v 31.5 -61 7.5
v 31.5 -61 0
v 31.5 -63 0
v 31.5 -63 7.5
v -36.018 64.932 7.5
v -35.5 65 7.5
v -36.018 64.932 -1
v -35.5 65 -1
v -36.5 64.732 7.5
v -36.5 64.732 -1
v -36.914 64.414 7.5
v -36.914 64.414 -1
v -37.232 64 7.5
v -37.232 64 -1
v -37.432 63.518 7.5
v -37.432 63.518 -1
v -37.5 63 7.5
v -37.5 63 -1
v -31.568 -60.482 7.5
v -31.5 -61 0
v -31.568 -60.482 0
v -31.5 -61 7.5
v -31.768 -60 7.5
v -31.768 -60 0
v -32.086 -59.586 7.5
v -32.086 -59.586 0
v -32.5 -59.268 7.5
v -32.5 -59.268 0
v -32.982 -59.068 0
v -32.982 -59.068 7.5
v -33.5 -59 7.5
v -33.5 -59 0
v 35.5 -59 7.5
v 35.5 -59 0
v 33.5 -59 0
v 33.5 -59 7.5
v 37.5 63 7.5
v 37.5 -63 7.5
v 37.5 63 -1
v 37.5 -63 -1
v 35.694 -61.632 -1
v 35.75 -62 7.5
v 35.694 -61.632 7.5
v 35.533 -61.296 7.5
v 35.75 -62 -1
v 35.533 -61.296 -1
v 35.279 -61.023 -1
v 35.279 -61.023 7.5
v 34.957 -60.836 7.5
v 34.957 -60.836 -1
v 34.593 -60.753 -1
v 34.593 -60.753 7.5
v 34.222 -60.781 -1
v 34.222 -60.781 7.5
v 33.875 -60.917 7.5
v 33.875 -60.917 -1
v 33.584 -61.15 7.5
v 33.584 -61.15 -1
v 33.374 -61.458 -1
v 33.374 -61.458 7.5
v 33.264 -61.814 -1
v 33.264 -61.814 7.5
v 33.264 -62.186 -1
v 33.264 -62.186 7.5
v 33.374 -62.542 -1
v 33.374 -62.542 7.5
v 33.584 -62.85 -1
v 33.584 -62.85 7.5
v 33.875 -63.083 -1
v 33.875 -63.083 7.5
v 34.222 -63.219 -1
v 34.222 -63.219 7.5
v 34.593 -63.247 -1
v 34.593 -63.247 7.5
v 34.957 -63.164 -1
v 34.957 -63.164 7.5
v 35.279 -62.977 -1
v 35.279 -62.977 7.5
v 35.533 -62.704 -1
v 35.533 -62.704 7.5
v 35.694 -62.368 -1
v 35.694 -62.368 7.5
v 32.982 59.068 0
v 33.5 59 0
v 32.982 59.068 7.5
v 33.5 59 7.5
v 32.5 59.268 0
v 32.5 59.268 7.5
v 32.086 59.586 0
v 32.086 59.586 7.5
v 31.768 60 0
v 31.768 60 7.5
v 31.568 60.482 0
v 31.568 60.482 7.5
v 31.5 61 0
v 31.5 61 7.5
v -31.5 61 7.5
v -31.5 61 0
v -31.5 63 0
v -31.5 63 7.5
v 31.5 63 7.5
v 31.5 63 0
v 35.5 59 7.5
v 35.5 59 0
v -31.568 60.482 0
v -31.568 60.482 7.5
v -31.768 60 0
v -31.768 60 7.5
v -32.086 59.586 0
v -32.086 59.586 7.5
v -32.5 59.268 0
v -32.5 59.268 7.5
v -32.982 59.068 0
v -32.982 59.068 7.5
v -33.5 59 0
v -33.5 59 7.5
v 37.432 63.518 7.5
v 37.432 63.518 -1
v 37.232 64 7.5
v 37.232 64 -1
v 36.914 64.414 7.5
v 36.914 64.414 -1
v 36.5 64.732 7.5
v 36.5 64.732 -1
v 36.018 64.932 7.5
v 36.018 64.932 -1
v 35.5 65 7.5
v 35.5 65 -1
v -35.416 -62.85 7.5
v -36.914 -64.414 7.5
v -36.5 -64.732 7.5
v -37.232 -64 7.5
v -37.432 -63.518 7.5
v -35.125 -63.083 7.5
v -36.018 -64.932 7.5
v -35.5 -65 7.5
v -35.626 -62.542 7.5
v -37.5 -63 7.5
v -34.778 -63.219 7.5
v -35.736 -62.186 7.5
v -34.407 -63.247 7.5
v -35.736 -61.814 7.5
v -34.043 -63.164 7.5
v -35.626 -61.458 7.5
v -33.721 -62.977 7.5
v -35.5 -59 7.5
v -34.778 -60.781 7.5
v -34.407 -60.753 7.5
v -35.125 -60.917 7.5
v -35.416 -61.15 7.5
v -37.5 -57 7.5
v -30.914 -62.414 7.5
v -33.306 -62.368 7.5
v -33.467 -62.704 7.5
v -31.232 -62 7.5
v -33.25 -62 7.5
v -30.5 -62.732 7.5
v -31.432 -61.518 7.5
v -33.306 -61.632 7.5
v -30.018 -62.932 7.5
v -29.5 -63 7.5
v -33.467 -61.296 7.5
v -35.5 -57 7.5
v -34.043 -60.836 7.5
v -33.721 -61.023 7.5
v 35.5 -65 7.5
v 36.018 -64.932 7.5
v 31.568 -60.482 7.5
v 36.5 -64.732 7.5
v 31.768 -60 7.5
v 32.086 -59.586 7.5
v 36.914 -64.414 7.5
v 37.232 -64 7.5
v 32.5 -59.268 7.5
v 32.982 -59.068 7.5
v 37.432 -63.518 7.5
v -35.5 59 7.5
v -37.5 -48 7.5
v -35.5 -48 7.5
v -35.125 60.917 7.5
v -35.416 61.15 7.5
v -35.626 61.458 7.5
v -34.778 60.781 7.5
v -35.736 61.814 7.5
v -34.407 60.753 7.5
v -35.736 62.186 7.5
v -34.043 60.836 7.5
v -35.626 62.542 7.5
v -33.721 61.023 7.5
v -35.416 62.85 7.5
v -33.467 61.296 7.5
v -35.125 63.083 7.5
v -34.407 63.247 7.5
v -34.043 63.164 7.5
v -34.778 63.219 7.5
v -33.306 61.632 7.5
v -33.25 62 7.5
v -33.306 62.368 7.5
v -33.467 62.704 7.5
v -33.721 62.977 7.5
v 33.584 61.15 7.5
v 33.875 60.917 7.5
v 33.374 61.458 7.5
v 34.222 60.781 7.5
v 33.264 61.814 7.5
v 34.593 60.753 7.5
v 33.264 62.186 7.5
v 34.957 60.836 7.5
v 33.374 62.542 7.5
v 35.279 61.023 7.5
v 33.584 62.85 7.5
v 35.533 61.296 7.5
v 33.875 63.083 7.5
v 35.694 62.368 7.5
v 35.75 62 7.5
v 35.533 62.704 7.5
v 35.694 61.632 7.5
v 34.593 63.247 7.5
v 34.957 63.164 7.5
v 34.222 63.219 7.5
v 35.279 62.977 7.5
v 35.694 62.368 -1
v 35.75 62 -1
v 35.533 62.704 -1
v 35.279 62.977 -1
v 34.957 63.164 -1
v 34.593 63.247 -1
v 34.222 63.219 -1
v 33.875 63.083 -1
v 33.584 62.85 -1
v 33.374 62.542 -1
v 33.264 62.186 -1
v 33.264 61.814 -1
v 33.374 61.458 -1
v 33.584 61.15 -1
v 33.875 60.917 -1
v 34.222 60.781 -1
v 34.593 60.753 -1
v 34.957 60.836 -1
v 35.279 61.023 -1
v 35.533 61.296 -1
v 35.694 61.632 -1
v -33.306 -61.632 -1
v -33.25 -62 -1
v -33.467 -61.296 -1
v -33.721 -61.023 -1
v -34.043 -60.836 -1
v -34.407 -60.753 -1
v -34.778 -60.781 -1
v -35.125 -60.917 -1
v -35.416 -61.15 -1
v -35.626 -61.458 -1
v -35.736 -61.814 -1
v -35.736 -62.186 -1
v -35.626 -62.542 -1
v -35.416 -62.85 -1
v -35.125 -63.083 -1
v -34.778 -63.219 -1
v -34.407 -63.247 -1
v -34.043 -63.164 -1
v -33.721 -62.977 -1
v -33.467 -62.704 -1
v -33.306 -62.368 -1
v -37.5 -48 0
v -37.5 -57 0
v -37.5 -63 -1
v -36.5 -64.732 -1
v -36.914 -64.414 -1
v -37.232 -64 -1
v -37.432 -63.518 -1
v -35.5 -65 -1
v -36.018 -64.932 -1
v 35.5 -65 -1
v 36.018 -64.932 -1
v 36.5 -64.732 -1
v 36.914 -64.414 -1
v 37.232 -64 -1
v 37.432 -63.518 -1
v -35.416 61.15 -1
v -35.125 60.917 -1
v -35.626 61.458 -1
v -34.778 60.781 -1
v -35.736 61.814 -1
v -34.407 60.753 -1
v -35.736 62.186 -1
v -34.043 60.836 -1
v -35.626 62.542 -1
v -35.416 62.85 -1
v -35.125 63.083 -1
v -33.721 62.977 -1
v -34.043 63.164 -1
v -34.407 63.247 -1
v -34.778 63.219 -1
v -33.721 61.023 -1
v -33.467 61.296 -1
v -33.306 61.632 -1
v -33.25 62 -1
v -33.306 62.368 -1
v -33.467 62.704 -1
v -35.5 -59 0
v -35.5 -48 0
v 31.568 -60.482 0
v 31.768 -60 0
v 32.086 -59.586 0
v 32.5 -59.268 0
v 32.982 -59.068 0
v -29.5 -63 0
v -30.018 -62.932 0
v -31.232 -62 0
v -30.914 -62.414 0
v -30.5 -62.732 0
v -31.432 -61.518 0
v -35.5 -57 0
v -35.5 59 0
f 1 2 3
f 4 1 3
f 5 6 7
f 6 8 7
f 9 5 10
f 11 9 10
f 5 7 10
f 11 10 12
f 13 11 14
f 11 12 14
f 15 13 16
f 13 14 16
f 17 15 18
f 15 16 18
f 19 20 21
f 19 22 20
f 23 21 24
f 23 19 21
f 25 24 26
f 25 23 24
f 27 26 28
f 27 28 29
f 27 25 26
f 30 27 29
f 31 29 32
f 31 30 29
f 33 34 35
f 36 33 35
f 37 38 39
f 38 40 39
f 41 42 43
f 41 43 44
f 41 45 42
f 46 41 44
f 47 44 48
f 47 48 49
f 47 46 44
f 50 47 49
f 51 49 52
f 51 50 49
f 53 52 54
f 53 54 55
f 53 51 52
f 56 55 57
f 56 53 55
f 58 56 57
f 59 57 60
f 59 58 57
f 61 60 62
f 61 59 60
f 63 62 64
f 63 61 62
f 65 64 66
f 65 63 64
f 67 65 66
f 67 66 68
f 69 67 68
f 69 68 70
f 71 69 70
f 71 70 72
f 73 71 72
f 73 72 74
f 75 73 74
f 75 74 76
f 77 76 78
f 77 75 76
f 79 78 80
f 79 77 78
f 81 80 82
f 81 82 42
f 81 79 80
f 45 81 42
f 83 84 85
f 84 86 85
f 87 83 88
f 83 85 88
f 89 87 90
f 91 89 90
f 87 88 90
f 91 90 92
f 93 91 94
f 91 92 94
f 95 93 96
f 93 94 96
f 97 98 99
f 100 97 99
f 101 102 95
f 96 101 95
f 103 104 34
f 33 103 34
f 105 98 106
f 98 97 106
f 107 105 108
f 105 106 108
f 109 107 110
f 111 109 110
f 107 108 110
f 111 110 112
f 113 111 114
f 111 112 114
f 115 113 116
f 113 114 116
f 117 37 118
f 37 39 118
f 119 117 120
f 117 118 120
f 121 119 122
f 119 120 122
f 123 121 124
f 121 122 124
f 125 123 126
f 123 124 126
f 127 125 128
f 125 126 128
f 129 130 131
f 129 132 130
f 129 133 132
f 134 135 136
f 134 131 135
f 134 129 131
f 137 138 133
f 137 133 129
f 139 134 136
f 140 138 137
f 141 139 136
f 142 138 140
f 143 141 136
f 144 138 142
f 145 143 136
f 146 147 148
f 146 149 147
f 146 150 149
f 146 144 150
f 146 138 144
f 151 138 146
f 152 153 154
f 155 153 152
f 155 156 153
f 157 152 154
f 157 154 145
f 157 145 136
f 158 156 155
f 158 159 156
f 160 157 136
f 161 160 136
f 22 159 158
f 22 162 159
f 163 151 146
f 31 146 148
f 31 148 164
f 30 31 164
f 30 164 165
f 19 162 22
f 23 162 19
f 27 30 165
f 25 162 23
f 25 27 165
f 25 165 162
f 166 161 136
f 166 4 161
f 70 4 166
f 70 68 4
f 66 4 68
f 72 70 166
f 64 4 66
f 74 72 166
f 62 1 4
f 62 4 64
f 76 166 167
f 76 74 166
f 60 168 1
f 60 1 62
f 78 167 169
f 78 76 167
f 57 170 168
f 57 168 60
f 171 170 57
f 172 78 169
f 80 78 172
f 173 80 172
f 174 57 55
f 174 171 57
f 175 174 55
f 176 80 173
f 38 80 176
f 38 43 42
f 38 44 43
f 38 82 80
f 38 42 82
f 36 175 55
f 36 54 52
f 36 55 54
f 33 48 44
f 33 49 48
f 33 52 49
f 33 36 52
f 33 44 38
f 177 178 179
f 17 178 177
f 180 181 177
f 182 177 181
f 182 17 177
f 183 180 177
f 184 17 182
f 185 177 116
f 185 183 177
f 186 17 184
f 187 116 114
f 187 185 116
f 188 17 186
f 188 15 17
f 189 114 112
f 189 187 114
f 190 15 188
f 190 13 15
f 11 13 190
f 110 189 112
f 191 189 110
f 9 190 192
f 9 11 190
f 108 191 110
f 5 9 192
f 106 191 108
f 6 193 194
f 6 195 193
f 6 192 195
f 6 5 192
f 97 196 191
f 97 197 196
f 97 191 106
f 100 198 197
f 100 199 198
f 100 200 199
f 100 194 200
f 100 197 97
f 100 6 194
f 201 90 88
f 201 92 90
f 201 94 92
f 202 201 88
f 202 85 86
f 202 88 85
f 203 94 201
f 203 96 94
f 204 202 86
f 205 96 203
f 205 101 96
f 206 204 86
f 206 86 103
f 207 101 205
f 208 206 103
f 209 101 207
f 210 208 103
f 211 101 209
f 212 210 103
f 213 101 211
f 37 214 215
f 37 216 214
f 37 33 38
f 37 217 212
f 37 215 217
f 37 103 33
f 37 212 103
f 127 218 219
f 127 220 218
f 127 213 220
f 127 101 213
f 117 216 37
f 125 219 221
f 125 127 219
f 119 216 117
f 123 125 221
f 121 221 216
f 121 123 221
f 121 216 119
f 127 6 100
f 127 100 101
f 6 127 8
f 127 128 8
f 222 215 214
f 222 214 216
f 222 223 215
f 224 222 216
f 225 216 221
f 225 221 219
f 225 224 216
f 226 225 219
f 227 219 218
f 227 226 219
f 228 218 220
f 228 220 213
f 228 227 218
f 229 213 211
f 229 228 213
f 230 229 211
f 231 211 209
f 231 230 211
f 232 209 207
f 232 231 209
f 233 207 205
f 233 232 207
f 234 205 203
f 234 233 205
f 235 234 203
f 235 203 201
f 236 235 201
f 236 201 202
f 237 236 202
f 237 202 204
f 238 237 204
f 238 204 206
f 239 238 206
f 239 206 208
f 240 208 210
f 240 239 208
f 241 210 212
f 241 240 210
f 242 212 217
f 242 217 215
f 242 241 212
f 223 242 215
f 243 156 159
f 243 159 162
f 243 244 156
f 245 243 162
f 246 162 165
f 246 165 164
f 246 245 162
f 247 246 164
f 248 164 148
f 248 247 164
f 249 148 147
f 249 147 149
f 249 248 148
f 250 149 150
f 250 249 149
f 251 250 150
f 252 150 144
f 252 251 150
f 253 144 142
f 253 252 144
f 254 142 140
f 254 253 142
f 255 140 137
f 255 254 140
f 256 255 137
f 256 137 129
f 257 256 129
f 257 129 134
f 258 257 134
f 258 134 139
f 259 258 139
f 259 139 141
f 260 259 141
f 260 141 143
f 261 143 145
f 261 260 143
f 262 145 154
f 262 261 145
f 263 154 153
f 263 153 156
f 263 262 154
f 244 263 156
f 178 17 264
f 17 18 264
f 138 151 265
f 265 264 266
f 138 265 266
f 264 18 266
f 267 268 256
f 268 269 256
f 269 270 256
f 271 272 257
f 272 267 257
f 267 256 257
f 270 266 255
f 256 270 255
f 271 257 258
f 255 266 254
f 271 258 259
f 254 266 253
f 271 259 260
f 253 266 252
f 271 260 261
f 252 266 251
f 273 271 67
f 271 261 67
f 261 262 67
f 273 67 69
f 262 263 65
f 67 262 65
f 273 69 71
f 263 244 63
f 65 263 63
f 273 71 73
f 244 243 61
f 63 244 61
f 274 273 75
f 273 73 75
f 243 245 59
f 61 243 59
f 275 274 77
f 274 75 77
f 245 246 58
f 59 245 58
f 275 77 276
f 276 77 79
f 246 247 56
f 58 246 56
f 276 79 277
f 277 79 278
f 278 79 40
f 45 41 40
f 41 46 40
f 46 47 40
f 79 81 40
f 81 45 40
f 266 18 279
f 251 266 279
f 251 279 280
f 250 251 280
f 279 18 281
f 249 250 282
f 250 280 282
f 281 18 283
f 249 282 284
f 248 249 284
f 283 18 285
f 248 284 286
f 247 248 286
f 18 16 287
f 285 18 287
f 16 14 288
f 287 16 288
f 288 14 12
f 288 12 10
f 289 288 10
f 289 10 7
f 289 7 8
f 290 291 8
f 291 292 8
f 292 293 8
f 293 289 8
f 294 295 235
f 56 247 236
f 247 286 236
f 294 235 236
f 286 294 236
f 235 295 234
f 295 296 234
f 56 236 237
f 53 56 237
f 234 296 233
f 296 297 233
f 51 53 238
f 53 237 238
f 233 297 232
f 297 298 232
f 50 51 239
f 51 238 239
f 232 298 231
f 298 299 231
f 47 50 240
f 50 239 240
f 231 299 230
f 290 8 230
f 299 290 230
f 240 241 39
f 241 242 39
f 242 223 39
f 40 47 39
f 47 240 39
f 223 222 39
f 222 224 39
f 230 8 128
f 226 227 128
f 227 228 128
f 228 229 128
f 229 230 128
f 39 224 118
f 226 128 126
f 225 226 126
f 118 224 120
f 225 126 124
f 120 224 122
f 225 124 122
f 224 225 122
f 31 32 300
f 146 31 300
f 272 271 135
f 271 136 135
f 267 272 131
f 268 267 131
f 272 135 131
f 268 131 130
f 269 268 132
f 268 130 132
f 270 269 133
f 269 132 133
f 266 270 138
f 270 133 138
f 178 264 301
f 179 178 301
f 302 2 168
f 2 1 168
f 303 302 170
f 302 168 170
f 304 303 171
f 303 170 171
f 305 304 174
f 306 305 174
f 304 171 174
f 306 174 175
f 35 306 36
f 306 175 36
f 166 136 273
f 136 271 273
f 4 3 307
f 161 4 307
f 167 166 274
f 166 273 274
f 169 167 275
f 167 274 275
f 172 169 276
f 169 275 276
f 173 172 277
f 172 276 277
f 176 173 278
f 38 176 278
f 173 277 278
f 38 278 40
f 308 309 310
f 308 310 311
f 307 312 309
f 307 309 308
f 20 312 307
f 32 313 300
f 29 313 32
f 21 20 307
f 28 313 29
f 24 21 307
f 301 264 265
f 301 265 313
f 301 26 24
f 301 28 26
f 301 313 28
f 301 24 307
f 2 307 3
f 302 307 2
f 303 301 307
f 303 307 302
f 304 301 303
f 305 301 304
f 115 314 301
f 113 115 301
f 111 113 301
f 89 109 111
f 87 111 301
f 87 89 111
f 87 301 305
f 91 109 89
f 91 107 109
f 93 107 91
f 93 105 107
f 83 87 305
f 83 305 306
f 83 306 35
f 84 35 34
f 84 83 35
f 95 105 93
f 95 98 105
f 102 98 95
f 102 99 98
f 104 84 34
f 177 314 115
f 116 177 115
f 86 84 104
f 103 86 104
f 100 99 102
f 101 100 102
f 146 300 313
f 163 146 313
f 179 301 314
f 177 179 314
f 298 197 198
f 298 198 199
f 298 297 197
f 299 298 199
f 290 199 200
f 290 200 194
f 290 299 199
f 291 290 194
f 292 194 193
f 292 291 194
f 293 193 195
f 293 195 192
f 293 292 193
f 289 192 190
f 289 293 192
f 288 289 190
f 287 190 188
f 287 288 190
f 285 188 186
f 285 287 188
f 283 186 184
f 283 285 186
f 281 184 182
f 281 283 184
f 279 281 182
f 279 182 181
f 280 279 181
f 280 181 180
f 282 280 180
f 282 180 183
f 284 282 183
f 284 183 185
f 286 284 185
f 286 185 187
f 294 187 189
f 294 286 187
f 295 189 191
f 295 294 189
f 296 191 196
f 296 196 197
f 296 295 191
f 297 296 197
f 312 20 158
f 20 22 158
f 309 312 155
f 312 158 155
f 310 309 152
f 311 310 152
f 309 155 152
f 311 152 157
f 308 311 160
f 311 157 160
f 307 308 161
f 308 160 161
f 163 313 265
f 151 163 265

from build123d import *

# Parameters (mm, degrees)
F0_R     = 1.25
F0_W     = 2
F0_H     = 9
F1_DEPTH = 1
F2_DEPTH = 7.5
F3_R     = 1.99999


# Not quite as in the source:
# - a fillet or chamfer is up to 0.001 mm smaller than in the source, because OpenCascade refuses the exact size


with BuildPart() as f1:
    # F0 (on Top) → F1 (new body)
    with BuildSketch(Plane.XY):
        Polygon((-35.5, -48), (-35.5, 59), (-31.5, 59), (-31.5, 63), (31.5, 63), (31.5, 59), (35.5, 59), (35.5, -59), (31.5, -59), (31.5, -63), (-31.5, -63), (-31.5, -59), (-35.5, -59), (-35.5, -57), (-37.5, -57), (-37.5, -65), (37.5, -65), (37.5, 65), (-37.5, 65), (-37.5, -48), align=None)
        with Locations((-34.5, -62)):
            Circle(F0_R, mode=Mode.SUBTRACT)
        with Locations((34.5, -62)):
            Circle(F0_R, mode=Mode.SUBTRACT)
        with Locations((-34.5, 62)):
            Circle(F0_R, mode=Mode.SUBTRACT)
        with Locations((34.5, 62)):
            Circle(F0_R, mode=Mode.SUBTRACT)
        Polygon((-31.5, 59), (-35.5, 59), (-35.5, -48), (-35.5, -57), (-35.5, -59), (-31.5, -59), (-31.5, -63), (31.5, -63), (31.5, -59), (35.5, -59), (35.5, 59), (31.5, 59), (31.5, 63), (-31.5, 63), align=None)
        with Locations((-36.5, -52.5)):
            Rectangle(F0_W, F0_H)
    extrude(amount=-F1_DEPTH)

    # F0 (on Top) → F2 (join)
    with BuildSketch(Plane.XY):
        Polygon((-35.5, -48), (-35.5, 59), (-31.5, 59), (-31.5, 63), (31.5, 63), (31.5, 59), (35.5, 59), (35.5, -59), (31.5, -59), (31.5, -63), (-31.5, -63), (-31.5, -59), (-35.5, -59), (-35.5, -57), (-37.5, -57), (-37.5, -65), (37.5, -65), (37.5, 65), (-37.5, 65), (-37.5, -48), align=None)
        with Locations((-34.5, -62)):
            Circle(F0_R, mode=Mode.SUBTRACT)
        with Locations((34.5, -62)):
            Circle(F0_R, mode=Mode.SUBTRACT)
        with Locations((-34.5, 62)):
            Circle(F0_R, mode=Mode.SUBTRACT)
        with Locations((34.5, 62)):
            Circle(F0_R, mode=Mode.SUBTRACT)
    extrude(amount=F2_DEPTH)

    # F3 (radius 2 in the source; OpenCascade refuses exactly that, so slightly less here)
    f3_edges = [f1.edges().sort_by_distance(p)[0] for p in [
        (37.5, -65, 3.25),
        (37.5, 65, 3.25),
        (-37.5, 65, 3.25),
        (31.5, -59, 3.75),
        (-31.5, -63, 3.75),
        (-37.5, -65, 3.25),
        (-31.5, 59, 3.75),
        (31.5, 59, 3.75),
        (-31.5, -59, 3.75),
    ]]
    fillet(f3_edges, radius=F3_R)


solid = f1.part
